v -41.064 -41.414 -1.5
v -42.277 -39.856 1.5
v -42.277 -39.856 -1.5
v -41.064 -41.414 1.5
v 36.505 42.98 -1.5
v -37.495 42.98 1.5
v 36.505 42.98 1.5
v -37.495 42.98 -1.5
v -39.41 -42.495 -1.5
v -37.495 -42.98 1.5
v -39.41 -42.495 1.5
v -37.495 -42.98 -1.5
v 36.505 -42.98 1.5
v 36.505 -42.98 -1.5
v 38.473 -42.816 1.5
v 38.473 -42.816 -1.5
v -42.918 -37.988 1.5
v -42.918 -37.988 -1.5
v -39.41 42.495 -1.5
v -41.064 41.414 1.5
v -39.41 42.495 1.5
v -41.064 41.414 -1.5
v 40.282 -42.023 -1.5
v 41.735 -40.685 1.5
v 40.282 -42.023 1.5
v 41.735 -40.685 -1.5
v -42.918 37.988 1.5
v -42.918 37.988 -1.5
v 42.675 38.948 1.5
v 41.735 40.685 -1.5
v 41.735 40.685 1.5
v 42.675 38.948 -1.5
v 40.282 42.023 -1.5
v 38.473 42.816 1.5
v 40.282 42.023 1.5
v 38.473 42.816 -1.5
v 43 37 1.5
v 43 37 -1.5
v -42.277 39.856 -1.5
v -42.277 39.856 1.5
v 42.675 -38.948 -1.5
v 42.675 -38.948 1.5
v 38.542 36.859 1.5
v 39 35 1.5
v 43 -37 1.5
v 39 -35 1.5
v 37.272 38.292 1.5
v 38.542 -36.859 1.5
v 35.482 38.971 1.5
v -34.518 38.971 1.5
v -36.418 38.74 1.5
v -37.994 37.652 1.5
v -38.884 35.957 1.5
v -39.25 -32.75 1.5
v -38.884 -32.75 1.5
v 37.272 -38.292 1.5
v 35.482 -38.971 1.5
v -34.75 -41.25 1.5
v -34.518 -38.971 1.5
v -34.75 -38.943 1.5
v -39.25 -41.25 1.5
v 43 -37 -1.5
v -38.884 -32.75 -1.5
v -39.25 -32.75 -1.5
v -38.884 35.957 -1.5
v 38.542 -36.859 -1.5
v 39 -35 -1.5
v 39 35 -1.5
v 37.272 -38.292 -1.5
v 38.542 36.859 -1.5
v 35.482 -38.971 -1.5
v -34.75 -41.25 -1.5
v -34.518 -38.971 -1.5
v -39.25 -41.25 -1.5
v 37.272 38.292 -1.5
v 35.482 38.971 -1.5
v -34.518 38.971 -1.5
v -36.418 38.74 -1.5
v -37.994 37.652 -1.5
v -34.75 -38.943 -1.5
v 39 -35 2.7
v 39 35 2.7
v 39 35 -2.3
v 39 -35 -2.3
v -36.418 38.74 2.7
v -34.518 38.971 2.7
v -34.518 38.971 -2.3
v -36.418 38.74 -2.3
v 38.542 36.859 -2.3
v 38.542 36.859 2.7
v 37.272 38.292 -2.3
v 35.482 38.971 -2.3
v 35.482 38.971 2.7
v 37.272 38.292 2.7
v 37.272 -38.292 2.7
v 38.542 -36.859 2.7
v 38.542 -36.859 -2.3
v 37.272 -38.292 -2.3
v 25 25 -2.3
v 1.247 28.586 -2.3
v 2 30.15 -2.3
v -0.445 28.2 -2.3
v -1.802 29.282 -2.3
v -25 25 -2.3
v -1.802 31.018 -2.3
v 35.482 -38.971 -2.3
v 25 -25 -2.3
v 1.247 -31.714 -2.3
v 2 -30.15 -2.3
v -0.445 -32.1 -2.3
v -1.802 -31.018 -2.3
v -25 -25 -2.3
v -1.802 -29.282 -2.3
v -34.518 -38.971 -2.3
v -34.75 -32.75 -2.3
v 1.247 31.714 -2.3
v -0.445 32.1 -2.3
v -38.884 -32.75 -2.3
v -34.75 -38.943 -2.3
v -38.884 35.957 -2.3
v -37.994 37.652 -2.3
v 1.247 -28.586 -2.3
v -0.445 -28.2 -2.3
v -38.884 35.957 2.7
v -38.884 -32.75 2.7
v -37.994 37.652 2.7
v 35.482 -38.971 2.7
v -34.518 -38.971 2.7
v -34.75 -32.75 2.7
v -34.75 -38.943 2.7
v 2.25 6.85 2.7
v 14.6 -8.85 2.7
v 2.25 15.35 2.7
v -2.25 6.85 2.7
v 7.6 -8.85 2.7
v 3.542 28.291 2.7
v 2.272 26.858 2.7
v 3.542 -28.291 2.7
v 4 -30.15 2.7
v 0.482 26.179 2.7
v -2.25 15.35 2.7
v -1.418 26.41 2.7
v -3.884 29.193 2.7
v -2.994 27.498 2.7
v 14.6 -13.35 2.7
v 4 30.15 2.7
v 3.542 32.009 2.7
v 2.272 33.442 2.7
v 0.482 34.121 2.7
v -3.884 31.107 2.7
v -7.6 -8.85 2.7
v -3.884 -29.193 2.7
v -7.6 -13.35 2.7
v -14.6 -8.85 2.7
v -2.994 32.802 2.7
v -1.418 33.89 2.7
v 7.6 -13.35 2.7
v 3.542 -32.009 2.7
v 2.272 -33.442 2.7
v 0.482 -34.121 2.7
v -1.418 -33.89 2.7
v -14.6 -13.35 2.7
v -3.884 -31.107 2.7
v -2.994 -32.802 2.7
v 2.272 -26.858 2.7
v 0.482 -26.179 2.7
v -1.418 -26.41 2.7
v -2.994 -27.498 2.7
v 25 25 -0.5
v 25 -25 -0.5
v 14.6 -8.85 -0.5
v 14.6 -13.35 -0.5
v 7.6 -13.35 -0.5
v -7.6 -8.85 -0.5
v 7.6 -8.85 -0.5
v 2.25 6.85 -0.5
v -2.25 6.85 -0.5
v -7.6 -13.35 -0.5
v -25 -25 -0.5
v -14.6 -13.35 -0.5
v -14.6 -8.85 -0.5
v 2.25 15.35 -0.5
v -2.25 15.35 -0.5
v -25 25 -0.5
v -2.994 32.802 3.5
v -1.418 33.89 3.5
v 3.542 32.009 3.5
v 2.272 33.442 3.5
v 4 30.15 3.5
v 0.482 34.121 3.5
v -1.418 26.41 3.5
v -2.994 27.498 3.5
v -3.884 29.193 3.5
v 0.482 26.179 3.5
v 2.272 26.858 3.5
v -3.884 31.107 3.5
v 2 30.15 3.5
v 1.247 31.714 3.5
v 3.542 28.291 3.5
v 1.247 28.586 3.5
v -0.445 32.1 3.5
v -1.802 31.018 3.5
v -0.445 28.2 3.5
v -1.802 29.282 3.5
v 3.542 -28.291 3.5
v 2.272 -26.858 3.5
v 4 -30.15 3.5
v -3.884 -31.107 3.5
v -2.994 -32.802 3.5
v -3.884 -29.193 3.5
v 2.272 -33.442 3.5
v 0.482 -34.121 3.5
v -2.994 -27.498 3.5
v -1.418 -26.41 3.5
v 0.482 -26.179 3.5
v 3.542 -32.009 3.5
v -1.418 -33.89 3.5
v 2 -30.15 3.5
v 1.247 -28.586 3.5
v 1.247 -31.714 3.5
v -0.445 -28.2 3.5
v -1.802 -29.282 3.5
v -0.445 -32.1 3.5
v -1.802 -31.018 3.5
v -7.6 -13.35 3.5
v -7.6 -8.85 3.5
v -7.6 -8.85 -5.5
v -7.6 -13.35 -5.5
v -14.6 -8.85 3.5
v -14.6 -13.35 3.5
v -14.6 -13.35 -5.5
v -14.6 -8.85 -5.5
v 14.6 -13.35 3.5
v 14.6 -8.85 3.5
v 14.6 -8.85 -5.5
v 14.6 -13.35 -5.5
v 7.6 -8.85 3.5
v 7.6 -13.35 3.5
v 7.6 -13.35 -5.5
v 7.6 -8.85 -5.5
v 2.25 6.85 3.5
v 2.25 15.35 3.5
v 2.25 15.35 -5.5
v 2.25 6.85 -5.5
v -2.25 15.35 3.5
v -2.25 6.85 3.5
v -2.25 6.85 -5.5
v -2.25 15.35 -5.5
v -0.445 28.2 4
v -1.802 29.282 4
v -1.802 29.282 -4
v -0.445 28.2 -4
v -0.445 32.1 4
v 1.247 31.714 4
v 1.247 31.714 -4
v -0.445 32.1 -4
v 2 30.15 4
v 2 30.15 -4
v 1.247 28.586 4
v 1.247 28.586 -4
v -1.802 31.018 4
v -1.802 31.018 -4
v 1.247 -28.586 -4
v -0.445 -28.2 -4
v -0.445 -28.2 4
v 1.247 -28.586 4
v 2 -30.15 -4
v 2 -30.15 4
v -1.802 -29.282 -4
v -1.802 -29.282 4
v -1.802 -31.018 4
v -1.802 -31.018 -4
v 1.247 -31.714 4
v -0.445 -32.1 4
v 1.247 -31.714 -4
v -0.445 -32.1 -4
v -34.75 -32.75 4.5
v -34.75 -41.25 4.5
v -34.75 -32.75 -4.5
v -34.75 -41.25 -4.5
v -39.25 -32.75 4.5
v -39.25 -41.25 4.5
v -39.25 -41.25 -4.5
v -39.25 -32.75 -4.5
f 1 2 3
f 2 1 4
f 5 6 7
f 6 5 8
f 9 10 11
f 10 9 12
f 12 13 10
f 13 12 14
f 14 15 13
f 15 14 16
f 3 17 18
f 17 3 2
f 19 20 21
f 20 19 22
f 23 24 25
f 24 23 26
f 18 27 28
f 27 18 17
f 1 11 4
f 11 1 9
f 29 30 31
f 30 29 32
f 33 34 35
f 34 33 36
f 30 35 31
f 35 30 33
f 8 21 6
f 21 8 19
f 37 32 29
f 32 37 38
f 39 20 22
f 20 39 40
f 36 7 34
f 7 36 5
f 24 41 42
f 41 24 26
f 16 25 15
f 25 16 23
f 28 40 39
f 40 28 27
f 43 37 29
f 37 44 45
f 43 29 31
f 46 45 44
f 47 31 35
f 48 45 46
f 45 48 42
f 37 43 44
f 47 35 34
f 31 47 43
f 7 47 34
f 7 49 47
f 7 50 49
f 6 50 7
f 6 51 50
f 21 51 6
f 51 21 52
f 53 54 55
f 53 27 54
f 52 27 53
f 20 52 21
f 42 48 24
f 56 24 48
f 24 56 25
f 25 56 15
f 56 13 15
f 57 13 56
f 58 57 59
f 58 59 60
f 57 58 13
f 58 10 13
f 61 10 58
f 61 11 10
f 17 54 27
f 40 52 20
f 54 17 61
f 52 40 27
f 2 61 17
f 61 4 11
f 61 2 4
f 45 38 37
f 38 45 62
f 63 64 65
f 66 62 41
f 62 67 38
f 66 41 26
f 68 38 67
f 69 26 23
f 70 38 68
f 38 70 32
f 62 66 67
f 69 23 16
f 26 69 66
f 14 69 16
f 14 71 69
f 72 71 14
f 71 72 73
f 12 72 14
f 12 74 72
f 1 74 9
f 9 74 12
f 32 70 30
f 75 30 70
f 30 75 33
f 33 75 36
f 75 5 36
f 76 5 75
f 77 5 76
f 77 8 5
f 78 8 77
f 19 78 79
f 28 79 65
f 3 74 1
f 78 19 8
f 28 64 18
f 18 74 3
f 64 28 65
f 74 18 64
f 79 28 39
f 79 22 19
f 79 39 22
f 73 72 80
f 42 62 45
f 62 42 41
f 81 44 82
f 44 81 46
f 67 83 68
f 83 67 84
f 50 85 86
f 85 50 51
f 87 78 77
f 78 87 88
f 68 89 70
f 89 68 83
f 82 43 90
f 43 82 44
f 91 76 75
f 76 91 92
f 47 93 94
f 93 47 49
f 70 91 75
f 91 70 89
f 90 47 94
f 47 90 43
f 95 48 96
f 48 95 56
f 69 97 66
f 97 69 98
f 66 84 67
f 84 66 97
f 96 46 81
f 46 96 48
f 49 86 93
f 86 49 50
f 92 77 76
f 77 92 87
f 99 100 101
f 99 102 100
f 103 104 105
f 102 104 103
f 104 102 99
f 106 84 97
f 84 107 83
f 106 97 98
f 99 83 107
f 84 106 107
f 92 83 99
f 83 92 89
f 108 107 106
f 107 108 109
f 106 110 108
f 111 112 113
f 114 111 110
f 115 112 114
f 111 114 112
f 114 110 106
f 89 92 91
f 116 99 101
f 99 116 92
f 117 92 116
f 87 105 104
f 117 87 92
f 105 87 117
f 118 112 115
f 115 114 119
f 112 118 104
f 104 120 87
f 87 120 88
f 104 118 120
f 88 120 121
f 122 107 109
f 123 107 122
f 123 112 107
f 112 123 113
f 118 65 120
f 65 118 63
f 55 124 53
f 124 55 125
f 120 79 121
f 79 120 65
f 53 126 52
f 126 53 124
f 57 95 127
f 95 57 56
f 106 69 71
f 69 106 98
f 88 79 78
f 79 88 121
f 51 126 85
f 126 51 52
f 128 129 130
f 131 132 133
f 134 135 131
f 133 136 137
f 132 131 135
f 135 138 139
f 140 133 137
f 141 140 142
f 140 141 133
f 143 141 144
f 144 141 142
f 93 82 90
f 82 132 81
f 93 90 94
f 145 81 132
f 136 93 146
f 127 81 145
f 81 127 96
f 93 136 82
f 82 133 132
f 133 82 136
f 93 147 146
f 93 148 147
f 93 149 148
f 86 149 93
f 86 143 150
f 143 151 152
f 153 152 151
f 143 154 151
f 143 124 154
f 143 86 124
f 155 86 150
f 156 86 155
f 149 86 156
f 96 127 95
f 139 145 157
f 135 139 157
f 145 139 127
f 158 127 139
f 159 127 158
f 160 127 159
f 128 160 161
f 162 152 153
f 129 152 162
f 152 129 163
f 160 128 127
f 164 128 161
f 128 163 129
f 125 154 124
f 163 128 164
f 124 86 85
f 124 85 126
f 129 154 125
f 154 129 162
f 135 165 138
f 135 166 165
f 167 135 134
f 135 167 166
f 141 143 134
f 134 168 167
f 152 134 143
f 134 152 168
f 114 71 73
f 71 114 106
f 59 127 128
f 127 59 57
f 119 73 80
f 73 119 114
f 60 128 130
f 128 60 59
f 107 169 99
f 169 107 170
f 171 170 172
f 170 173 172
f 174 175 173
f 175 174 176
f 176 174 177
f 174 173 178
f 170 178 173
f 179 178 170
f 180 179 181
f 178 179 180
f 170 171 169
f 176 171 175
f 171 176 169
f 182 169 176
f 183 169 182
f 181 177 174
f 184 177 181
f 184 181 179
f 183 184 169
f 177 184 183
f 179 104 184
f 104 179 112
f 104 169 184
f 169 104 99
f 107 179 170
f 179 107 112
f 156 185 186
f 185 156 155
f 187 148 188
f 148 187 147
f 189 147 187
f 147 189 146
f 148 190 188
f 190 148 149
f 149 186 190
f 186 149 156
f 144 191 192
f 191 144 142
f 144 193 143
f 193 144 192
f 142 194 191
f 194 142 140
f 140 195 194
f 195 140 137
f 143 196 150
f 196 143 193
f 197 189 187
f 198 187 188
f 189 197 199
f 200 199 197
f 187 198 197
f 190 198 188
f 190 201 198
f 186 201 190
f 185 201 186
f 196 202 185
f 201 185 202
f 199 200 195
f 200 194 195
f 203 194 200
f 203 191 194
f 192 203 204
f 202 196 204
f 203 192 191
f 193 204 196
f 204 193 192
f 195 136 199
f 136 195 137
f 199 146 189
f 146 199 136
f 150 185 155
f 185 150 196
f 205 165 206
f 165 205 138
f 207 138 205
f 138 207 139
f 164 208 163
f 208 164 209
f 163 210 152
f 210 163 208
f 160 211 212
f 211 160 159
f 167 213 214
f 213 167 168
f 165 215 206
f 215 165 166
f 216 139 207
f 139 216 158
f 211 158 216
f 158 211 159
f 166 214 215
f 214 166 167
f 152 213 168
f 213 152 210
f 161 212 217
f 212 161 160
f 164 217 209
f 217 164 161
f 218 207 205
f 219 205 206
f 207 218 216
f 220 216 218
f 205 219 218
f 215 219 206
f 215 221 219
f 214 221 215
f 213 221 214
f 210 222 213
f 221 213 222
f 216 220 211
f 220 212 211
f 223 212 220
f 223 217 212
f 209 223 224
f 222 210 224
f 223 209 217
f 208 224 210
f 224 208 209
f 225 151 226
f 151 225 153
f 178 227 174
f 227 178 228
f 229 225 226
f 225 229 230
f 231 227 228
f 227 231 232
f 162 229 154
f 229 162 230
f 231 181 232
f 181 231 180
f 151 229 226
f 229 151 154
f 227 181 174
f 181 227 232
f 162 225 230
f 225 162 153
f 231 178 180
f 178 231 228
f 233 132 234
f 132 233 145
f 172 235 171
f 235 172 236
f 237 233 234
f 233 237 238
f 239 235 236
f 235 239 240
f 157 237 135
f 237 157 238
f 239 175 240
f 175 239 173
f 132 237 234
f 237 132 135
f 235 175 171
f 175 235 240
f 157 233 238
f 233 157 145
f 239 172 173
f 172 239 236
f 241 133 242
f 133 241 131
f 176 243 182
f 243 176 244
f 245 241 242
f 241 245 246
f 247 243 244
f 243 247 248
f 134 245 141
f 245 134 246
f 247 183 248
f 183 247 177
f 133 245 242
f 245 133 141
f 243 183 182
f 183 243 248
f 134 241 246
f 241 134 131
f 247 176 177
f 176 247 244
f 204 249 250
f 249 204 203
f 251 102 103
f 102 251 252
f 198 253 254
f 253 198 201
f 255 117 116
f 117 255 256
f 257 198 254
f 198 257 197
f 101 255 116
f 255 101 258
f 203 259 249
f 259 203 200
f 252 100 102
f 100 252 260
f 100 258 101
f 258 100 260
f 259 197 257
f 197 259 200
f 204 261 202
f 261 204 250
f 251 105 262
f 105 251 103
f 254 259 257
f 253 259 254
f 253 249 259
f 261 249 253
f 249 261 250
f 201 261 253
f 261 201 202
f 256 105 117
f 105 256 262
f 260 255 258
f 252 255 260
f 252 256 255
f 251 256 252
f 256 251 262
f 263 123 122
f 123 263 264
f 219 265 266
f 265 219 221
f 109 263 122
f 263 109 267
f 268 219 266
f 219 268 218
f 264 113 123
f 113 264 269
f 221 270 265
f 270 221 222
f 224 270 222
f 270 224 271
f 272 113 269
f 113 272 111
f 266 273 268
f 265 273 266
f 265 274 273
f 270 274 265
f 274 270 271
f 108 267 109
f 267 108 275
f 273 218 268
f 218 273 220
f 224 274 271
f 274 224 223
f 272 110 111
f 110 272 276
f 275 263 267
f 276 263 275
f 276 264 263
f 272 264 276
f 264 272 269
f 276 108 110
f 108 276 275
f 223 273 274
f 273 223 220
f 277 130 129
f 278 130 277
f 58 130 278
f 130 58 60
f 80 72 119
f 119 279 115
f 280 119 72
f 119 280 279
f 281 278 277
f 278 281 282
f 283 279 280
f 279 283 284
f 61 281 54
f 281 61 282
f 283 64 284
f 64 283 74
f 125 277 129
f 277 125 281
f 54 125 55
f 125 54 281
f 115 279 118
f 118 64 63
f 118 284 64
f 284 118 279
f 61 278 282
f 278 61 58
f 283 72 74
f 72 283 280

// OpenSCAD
// Parameters
faceplate_width = 86; //[43:172:1]
faceplate_height = 86; //[43:172:1]
overall_depth = 25; //[12:50:1]
faceplate_thickness_edge = 3; //[1.5:6:0.5]
faceplate_thickness_center = 5; //[2.5:10:0.5]
corner_radius = 6; //[3:12:0.5]
top_profile_taper_enabled = 1; //[0:1:1]
top_profile_inset = 2; //[0.5:6:0.5]
taper_overlap = 0.8; //[0.2:2:0.1]
pin_slot_live_neutral_spacing_x = 22.2; //[11.1:44.4:0.1]
pin_slot_live_neutral_offset_y = -11.1; //[-22.2:0:0.1]
pin_slot_earth_offset_y = 11.1; //[0:22.2:0.1]
pin_slot_live_neutral_size_x = 7; //[3.5:14:0.1]
pin_slot_live_neutral_size_y = 4.5; //[2.25:9:0.1]
pin_slot_earth_size_x = 4.5; //[2.25:9:0.1]
pin_slot_earth_size_y = 8.5; //[4.25:17:0.1]
pin_slot_depth = 8; //[4:16:0.5]
rear_cavity_wall_thickness = 2; //[1:4:0.5]
rear_cavity_clearance_cube = 50; //[25:100:1]
rear_cavity_depth = 18; //[9:36:1]
mounting_screw_spacing_y = 60.3; //[30.15:120.6:0.1]
mounting_screw_clearance_diameter = 4; //[2:8:0.1]
countersink_enabled = 1; //[0:1:1]
counterbore_diameter_front = 8; //[4:16:0.1]
counterbore_depth_front = 2; //[1:5:0.1]
counterbore_diameter_back = 0; //[0:16:0.1]
counterbore_depth_back = 0; //[0:6:0.1]
screw_hole_depth_extra = 2; //[1:10:0.5]
eps_overlap = 1; //[0.5:2:0.1]

// Mains Socket - complete geometry
module mains_socket() {
  color("White") {
    // Faceplate with taper
    difference() {
      union() {
        hull() {
          translate([-faceplate_width/2 + corner_radius, faceplate_height/2 - corner_radius, 0])
            cylinder(r=corner_radius, h=faceplate_thickness_edge, center=true);
          translate([faceplate_width/2 - corner_radius, faceplate_height/2 - corner_radius, 0])
            cylinder(r=corner_radius, h=faceplate_thickness_edge, center=true);
          translate([-faceplate_width/2 + corner_radius, -faceplate_height/2 + corner_radius, 0])
            cylinder(r=corner_radius, h=faceplate_thickness_edge, center=true);
          translate([faceplate_width/2 - corner_radius, -faceplate_height/2 + corner_radius, 0])
            cylinder(r=corner_radius, h=faceplate_thickness_edge, center=true);
        }
        if (top_profile_taper_enabled) {
          hull() {
            translate([-(faceplate_width/2 - corner_radius) + top_profile_inset, (faceplate_height/2 - corner_radius) - top_profile_inset, (faceplate_thickness_center - faceplate_thickness_edge)/2 - taper_overlap])
              cylinder(r=max(corner_radius - top_profile_inset, corner_radius*0.3), h=faceplate_thickness_center, center=true);
            translate([(faceplate_width/2 - corner_radius) - top_profile_inset, (faceplate_height/2 - corner_radius) - top_profile_inset, (faceplate_thickness_center - faceplate_thickness_edge)/2 - taper_overlap])
              cylinder(r=max(corner_radius - top_profile_inset, corner_radius*0.3), h=faceplate_thickness_center, center=true);
            translate([-(faceplate_width/2 - corner_radius) + top_profile_inset, -(faceplate_height/2 - corner_radius) + top_profile_inset, (faceplate_thickness_center - faceplate_thickness_edge)/2 - taper_overlap])
              cylinder(r=max(corner_radius - top_profile_inset, corner_radius*0.3), h=faceplate_thickness_center, center=true);
            translate([(faceplate_width/2 - corner_radius) - top_profile_inset, -(faceplate_height/2 - corner_radius) + top_profile_inset, (faceplate_thickness_center - faceplate_thickness_edge)/2 - taper_overlap])
              cylinder(r=max(corner_radius - top_profile_inset, corner_radius*0.3), h=faceplate_thickness_center, center=true);
          }
        }
      }
      // Rear cavity
      translate([0, 0, -faceplate_thickness_edge/2 - rear_cavity_depth/2 + eps_overlap/2])
        cube([rear_cavity_clearance_cube, rear_cavity_clearance_cube, rear_cavity_depth + eps_overlap], center=true);
    }
  }
}

// Mains Socket Holes - complete geometry
module mains_socket_holes() {
  color("Black") {
    // Pin slots
    translate([-pin_slot_live_neutral_spacing_x/2, pin_slot_live_neutral_offset_y, faceplate_thickness_center/2 - pin_slot_depth/2 + eps_overlap/2])
      cube([pin_slot_live_neutral_size_x, pin_slot_live_neutral_size_y, pin_slot_depth + eps_overlap], center=true);
    translate([pin_slot_live_neutral_spacing_x/2, pin_slot_live_neutral_offset_y, faceplate_thickness_center/2 - pin_slot_depth/2 + eps_overlap/2])
      cube([pin_slot_live_neutral_size_x, pin_slot_live_neutral_size_y, pin_slot_depth + eps_overlap], center=true);
    translate([0, pin_slot_earth_offset_y, faceplate_thickness_center/2 - pin_slot_depth/2 + eps_overlap/2])
      cube([pin_slot_earth_size_x, pin_slot_earth_size_y, pin_slot_depth + eps_overlap], center=true);

    // Mounting screw holes
    translate([0, mounting_screw_spacing_y/2, 0])
      cylinder(r=mounting_screw_clearance_diameter/2, h=faceplate_thickness_center + screw_hole_depth_extra + eps_overlap, center=true);
    translate([0, -mounting_screw_spacing_y/2, 0])
      cylinder(r=mounting_screw_clearance_diameter/2, h=faceplate_thickness_center + screw_hole_depth_extra + eps_overlap, center=true);

    // Countersinks/counterbores
    if (countersink_enabled) {
      translate([0, mounting_screw_spacing_y/2, faceplate_thickness_center/2 - counterbore_depth_front/2 + eps_overlap/2])
        cylinder(r=counterbore_diameter_front/2, h=counterbore_depth_front + eps_overlap, center=true);
      translate([0, -mounting_screw_spacing_y/2, faceplate_thickness_center/2 - counterbore_depth_front/2 + eps_overlap/2])
        cylinder(r=counterbore_diameter_front/2, h=counterbore_depth_front + eps_overlap, center=true);
    }
  }
}

// Mains Socket Earth Position - complete geometry
module mains_socket_earth_position() {
  color("Green") {
    translate([-faceplate_width/2 + rear_cavity_wall_thickness + mounting_screw_clearance_diameter, -faceplate_height/2 + rear_cavity_wall_thickness + mounting_screw_clearance_diameter, 0])
      cube([pin_slot_earth_size_x, pin_slot_earth_size_y, pin_slot_depth + eps_overlap], center=true);
  }
}

// Assembly
module assembly() {
  mains_socket();
  mains_socket_holes();
  mains_socket_earth_position();
}

assembly();
